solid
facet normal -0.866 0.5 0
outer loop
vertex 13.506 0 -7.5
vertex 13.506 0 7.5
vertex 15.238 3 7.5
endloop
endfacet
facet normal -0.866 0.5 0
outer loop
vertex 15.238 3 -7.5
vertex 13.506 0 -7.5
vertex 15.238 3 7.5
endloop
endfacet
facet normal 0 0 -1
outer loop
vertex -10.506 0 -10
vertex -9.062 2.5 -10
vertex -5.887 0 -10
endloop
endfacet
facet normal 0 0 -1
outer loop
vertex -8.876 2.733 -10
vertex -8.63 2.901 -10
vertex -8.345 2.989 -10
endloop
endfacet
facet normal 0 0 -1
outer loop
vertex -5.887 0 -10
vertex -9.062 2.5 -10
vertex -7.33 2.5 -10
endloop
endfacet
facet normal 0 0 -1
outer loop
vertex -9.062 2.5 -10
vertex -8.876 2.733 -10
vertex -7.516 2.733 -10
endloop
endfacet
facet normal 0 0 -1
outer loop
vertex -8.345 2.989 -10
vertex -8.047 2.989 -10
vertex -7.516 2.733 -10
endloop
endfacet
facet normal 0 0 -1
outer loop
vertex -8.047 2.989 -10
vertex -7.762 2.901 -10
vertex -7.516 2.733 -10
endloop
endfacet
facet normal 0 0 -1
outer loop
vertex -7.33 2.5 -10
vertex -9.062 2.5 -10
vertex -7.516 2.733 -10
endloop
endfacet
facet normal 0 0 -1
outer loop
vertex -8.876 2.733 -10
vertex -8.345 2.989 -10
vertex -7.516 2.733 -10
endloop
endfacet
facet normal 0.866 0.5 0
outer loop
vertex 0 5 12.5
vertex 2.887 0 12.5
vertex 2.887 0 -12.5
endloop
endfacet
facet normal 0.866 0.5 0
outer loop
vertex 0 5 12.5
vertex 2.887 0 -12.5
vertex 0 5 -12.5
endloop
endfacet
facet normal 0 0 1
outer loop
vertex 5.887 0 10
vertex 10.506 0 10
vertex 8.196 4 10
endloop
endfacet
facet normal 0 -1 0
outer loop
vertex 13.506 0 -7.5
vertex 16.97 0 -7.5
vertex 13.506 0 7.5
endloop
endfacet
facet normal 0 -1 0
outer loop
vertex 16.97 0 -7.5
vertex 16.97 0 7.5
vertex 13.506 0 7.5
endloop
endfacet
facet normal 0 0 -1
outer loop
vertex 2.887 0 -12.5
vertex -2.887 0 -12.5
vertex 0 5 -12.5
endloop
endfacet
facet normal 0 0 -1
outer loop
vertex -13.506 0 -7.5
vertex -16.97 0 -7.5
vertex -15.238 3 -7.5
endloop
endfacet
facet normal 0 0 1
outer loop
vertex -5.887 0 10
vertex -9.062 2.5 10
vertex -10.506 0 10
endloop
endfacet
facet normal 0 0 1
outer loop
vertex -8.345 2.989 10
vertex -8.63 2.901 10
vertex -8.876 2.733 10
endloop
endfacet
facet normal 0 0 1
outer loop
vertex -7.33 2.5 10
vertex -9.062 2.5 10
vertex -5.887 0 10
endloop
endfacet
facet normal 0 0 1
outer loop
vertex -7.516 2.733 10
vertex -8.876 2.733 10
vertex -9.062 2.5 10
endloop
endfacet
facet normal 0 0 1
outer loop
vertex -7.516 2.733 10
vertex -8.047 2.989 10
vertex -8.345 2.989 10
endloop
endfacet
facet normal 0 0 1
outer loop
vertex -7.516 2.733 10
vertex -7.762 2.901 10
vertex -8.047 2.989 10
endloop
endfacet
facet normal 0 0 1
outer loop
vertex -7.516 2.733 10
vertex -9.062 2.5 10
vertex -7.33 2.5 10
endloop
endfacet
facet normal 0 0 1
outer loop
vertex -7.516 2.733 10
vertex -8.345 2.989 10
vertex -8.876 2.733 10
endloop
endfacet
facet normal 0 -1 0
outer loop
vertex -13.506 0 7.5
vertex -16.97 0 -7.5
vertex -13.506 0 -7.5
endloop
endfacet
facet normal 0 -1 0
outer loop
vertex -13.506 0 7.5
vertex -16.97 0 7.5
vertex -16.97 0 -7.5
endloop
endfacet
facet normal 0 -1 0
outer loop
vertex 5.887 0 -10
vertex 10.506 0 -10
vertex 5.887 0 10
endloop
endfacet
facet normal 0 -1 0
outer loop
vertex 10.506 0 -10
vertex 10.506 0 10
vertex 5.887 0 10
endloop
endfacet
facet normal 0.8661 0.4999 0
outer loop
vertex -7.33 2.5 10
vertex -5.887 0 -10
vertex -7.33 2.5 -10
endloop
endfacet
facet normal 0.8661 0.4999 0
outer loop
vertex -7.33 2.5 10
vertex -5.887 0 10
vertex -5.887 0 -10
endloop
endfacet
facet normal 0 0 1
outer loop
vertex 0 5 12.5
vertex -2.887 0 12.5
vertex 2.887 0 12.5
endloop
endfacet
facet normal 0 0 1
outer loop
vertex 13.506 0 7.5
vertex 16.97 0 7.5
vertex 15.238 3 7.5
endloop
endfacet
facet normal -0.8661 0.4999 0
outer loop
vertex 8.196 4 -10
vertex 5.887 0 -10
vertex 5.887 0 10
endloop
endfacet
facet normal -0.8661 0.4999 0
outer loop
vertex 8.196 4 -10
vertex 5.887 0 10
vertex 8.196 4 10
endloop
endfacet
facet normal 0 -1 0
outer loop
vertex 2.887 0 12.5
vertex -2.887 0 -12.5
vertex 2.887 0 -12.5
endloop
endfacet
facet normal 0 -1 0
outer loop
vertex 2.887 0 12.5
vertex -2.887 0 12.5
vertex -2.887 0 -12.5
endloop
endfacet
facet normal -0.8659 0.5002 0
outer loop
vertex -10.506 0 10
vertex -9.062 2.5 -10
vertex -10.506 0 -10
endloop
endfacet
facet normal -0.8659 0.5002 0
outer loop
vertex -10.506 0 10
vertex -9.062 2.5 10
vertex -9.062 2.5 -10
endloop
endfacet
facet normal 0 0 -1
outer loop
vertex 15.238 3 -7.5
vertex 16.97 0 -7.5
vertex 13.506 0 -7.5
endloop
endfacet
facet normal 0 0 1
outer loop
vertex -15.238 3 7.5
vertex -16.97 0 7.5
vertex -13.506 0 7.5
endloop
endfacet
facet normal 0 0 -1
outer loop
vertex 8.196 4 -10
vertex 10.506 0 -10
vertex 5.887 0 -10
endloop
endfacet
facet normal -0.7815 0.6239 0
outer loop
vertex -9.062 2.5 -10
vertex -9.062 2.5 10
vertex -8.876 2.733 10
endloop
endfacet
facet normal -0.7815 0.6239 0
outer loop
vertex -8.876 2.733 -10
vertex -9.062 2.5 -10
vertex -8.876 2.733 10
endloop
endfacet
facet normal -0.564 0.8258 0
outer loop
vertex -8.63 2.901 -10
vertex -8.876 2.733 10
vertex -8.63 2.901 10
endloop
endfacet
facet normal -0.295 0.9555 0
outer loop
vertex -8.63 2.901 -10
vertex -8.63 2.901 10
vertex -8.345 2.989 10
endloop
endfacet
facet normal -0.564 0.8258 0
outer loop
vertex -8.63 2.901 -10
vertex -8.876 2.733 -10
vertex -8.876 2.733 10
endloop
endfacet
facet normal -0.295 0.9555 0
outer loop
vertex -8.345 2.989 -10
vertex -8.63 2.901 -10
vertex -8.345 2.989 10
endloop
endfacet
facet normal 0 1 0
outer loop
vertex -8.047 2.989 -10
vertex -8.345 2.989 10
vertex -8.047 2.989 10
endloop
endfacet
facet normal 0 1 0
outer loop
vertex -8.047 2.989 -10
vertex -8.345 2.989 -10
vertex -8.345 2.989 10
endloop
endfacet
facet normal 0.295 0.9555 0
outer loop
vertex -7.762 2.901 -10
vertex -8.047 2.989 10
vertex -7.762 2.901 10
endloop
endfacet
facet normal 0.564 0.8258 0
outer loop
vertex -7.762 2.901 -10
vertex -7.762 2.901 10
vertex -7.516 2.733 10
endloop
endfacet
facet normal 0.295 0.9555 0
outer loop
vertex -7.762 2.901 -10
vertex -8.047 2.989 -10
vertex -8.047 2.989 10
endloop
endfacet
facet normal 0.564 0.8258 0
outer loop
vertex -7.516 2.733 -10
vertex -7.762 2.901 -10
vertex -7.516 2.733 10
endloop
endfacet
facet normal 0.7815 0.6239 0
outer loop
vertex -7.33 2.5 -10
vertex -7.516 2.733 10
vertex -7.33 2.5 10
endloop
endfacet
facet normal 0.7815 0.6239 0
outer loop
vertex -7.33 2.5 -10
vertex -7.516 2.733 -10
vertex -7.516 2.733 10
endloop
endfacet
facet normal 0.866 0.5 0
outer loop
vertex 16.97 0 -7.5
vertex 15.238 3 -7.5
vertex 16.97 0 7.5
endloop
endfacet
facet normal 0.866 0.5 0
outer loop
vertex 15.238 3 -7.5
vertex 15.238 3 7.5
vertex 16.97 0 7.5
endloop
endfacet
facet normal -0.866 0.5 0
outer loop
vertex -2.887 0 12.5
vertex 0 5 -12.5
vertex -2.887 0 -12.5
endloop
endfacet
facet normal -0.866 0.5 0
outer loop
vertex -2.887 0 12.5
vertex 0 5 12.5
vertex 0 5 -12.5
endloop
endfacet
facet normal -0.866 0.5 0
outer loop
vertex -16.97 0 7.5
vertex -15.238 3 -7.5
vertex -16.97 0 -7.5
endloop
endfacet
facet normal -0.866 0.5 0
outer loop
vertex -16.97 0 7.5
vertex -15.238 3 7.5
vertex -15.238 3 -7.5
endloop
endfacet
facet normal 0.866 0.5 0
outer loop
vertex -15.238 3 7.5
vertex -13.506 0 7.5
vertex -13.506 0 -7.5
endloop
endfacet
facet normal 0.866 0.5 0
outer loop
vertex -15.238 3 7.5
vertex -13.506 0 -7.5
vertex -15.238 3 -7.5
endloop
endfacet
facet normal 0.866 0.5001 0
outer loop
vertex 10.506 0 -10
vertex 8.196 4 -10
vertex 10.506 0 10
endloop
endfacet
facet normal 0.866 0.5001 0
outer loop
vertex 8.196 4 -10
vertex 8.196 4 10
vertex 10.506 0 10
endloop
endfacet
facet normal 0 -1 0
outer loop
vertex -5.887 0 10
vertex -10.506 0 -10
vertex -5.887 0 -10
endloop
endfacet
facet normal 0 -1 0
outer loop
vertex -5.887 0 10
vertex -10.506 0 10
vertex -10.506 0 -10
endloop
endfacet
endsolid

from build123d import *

# Parameters (mm, degrees)
F1_DEPTH = 12.5
F2_DEPTH = 10
F3_DEPTH = 7.5
F7_R     = 1


# Not quite as in the source:
# - the program builds the solid bodies; features that only make, move or delete a surface that nothing else refers to are left out


with BuildPart() as f1:
    # F0 (on Top) → F1 (new body, symmetric)
    with BuildSketch(Plane.XY):
        Polygon((-2.8867513459, 0), (2.8867513459, 0), (0, 5), align=None)
    extrude(amount=F1_DEPTH, both=True)


with BuildPart() as f2:
    # F0 (on Top) → F2 (new body, symmetric)
    with BuildSketch(Plane.XY):
        Polygon((-10.5055534995, 0), (-5.8867513459, 0), (-8.1961524227, 4), align=None)
    extrude(amount=F2_DEPTH, both=True)


with BuildPart() as f3:
    # F0 (on Top) → F3 (new body, symmetric)
    with BuildSketch(Plane.XY):
        Polygon((-16.9696551146, 0), (-13.5055534995, 0), (-15.237604307, 3), align=None)
    extrude(amount=F3_DEPTH, both=True)


with BuildPart() as f4_1:
    # F4: instance of F2
    add(f2.part.mirror(Plane.YZ))


with BuildPart() as f4_2:
    # F4: instance of F3
    add(f3.part.mirror(Plane.YZ))


with BuildPart() as f2_1:
    add(f2.part)

    # F7
    f7_edges = [f2_1.edges().sort_by_distance(p)[0] for p in [
        (-8.196152, 4, 0),
    ]]
    fillet(f7_edges, radius=F7_R)


solid = Compound([f1.part, f3.part, f4_1.part, f4_2.part, f2_1.part])
